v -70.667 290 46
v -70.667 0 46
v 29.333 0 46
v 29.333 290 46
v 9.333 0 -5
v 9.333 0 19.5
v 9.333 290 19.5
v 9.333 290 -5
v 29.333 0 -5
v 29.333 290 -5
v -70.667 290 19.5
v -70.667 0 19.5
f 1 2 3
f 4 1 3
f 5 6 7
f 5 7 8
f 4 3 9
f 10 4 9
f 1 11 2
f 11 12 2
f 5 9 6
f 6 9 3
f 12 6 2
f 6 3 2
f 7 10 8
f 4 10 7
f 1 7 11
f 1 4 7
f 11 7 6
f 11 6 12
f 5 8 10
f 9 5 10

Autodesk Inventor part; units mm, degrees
ref_plane "YZ Plane" through (0, 0, 0) normal (1, 0, 0) x (0, 1, 0)
ref_plane "XZ Plane" through (0, 0, 0) normal (0, 1, 0) x (-1, 0, 0)
ref_plane "XY Plane" through (0, 0, 0) normal (0, 0, 1) x (1, 0, 0)
sketch "Эскиз1" plane through (0, 0, 0) normal (0, 1, 0) x (-1, 0, 0)
  line L0 (70.6667, 46) -> (-29.3333, 46)
  line L1 (-29.3333, 46) -> (-29.3333, 19.5)
  line L2 (-29.3333, 19.5) -> (70.6667, 19.5)
  line L3 (70.6667, 19.5) -> (70.6667, 46)
  line L4 (-29.3333, 19.5) -> (-9.3333, 19.5)
  line L5 (-9.3333, 19.5) -> (-9.3333, -5)
  line L6 (-9.3333, -5) -> (-29.3333, -5)
  line L7 (-29.3333, -5) -> (-29.3333, 19.5)
  point P0 (0, 0)
  dimension "d0" = 26.5
  dimension "d1" = 100
  dimension "d2" = 20
  dimension "d5" = 51
extrude "Выдавливание1" add sketch "Эскиз1" along normal blind 290
properties part number "MegaUgolok"
